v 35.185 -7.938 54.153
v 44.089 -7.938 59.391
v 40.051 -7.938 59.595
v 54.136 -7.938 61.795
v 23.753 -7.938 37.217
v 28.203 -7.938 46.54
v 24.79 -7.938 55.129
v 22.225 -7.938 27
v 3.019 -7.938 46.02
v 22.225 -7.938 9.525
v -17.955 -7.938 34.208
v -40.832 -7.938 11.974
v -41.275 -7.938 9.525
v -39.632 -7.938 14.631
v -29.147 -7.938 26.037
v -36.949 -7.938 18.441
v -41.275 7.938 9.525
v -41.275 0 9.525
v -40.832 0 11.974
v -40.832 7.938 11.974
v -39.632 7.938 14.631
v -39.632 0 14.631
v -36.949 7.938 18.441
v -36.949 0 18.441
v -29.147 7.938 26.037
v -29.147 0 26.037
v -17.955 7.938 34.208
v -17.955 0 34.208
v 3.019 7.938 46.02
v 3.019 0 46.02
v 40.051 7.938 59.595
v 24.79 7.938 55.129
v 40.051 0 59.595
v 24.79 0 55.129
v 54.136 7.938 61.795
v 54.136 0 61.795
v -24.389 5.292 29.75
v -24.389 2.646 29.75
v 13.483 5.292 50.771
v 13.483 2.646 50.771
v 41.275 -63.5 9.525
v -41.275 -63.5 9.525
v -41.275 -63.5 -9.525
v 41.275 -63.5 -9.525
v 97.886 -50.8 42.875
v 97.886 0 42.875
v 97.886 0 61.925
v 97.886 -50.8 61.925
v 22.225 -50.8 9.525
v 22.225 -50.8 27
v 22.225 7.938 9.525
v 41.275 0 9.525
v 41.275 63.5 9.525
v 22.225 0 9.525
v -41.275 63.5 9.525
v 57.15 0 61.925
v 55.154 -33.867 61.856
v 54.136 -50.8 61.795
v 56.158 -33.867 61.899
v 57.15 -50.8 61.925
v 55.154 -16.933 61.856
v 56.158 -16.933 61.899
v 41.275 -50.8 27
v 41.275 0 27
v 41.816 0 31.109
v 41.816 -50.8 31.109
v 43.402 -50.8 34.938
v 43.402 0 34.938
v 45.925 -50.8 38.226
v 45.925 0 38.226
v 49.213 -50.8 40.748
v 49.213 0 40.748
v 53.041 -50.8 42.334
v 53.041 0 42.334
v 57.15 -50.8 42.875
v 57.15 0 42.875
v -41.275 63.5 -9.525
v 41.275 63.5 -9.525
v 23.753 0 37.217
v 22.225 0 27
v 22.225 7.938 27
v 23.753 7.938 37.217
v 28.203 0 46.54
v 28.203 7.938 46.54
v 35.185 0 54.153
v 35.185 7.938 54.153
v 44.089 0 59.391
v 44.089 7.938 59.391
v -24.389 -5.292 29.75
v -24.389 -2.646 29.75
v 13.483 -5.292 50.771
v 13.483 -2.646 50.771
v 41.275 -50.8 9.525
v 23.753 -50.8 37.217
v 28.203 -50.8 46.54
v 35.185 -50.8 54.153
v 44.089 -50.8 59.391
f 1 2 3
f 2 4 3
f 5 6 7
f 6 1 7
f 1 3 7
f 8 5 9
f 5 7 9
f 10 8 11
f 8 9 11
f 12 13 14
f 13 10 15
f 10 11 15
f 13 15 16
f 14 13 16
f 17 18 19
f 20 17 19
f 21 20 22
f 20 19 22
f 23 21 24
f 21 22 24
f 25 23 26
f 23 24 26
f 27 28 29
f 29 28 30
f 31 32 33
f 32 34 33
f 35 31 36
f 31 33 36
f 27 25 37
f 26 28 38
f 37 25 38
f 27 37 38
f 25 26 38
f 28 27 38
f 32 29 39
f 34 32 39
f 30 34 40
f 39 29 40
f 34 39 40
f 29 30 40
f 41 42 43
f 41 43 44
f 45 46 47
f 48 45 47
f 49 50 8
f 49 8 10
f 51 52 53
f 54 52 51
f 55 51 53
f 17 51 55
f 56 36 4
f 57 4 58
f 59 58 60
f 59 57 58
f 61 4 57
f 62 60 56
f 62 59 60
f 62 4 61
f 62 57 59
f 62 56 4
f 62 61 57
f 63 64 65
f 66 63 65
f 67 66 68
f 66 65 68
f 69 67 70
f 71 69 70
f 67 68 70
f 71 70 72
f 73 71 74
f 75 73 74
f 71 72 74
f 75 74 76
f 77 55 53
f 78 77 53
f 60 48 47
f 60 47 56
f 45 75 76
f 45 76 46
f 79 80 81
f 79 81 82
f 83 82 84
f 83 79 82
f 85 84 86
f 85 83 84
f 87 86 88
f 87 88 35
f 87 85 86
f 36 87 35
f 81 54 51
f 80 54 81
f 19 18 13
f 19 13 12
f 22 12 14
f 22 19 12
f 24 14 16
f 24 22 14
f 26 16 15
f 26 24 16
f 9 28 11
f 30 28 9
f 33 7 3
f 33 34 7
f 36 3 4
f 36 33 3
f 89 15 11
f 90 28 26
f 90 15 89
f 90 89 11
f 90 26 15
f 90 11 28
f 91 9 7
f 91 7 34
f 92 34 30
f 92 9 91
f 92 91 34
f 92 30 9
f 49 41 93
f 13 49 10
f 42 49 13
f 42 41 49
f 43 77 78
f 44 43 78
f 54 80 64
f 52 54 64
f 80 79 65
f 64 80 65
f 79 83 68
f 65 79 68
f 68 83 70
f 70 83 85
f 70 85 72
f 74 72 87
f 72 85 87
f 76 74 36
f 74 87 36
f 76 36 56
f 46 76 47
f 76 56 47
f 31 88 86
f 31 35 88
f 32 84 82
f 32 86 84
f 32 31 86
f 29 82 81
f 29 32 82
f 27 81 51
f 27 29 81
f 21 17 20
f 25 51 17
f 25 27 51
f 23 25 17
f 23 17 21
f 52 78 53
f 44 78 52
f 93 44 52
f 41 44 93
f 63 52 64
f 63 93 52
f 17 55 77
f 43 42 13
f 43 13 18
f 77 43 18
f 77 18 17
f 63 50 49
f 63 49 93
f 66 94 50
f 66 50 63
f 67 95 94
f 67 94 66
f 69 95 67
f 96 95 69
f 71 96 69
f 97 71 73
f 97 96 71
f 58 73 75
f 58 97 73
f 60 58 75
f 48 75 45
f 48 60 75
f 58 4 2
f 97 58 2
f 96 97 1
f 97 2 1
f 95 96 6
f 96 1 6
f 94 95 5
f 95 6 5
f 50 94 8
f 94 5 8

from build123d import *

# Parameters (mm, degrees)
F1_DEPTH = 63.5
F0_W     = 25.3930282362
F0_H     = 19.05
F2_DEPTH = 50.8
F3_DEPTH = 7.9375


with BuildPart() as f1:
    # F0 (on Front) → F1 (new body, symmetric)
    with BuildSketch(Plane.XZ):
        Polygon((-41.275, 9.525), (-41.275, -9.525), (41.275, -9.525), (41.275, 9.525), (22.225, 9.525), align=None)
    extrude(amount=F1_DEPTH, both=True)

    # F0 (on Front) → F2 (join)
    with BuildSketch(Plane.XZ):
        with Locations((85.1897055026, 52.4002)):
            Rectangle(F0_W, F0_H)
        with BuildLine():
            Line((22.225, 9.525), (41.275, 9.525))
            Line((41.275, 9.525), (41.275, 27.0002))
            ThreePointArc((41.275, 27.0002), (45.9246798487, 38.2255201513), (57.15, 42.8752))
            Line((57.15, 42.8752), (72.4931913845, 42.8752))
            Line((72.4931913845, 42.8752), (72.4931913845, 61.9252))
            Line((72.4931913845, 61.9252), (57.15, 61.9252))
            add(Edge.make_bspline(
                [(54.1357817201, 61.7948851281), (55.1598986423, 61.8639699544), (56.1652679987, 61.9077817435), (57.15, 61.9252)],
                knots=[108.4182059101, 108.4182059101, 108.4182059101, 108.4182059101, 111.5045361635, 111.5045361635, 111.5045361635, 111.5045361635], degree=3))
            ThreePointArc((54.1357817201, 61.7948851281), (31.4106604744, 50.6061743664), (22.225, 27.0002))
            Line((22.225, 27.0002), (22.225, 9.525))
        make_face()
    extrude(amount=F2_DEPTH)

    # F0 (on Front) → F3 (join, symmetric)
    with BuildSketch(Plane.XZ):
        with BuildLine():
            add(Edge.make_bspline(
                [(-41.275, 9.525), (-40.9503712961, 25.7539404931), (18.1600726333, 59.3680376075), (54.1357817201, 61.7948851281)],
                knots=[0, 0, 0, 0, 108.4182059101, 108.4182059101, 108.4182059101, 108.4182059101], degree=3))
            Line((-41.275, 9.525), (22.225, 9.525))
            Line((22.225, 9.525), (22.225, 27.0002))
            ThreePointArc((22.225, 27.0002), (31.4106604744, 50.6061743664), (54.1357817201, 61.7948851281))
        make_face()
    extrude(amount=F3_DEPTH, both=True)


solid = f1.part
